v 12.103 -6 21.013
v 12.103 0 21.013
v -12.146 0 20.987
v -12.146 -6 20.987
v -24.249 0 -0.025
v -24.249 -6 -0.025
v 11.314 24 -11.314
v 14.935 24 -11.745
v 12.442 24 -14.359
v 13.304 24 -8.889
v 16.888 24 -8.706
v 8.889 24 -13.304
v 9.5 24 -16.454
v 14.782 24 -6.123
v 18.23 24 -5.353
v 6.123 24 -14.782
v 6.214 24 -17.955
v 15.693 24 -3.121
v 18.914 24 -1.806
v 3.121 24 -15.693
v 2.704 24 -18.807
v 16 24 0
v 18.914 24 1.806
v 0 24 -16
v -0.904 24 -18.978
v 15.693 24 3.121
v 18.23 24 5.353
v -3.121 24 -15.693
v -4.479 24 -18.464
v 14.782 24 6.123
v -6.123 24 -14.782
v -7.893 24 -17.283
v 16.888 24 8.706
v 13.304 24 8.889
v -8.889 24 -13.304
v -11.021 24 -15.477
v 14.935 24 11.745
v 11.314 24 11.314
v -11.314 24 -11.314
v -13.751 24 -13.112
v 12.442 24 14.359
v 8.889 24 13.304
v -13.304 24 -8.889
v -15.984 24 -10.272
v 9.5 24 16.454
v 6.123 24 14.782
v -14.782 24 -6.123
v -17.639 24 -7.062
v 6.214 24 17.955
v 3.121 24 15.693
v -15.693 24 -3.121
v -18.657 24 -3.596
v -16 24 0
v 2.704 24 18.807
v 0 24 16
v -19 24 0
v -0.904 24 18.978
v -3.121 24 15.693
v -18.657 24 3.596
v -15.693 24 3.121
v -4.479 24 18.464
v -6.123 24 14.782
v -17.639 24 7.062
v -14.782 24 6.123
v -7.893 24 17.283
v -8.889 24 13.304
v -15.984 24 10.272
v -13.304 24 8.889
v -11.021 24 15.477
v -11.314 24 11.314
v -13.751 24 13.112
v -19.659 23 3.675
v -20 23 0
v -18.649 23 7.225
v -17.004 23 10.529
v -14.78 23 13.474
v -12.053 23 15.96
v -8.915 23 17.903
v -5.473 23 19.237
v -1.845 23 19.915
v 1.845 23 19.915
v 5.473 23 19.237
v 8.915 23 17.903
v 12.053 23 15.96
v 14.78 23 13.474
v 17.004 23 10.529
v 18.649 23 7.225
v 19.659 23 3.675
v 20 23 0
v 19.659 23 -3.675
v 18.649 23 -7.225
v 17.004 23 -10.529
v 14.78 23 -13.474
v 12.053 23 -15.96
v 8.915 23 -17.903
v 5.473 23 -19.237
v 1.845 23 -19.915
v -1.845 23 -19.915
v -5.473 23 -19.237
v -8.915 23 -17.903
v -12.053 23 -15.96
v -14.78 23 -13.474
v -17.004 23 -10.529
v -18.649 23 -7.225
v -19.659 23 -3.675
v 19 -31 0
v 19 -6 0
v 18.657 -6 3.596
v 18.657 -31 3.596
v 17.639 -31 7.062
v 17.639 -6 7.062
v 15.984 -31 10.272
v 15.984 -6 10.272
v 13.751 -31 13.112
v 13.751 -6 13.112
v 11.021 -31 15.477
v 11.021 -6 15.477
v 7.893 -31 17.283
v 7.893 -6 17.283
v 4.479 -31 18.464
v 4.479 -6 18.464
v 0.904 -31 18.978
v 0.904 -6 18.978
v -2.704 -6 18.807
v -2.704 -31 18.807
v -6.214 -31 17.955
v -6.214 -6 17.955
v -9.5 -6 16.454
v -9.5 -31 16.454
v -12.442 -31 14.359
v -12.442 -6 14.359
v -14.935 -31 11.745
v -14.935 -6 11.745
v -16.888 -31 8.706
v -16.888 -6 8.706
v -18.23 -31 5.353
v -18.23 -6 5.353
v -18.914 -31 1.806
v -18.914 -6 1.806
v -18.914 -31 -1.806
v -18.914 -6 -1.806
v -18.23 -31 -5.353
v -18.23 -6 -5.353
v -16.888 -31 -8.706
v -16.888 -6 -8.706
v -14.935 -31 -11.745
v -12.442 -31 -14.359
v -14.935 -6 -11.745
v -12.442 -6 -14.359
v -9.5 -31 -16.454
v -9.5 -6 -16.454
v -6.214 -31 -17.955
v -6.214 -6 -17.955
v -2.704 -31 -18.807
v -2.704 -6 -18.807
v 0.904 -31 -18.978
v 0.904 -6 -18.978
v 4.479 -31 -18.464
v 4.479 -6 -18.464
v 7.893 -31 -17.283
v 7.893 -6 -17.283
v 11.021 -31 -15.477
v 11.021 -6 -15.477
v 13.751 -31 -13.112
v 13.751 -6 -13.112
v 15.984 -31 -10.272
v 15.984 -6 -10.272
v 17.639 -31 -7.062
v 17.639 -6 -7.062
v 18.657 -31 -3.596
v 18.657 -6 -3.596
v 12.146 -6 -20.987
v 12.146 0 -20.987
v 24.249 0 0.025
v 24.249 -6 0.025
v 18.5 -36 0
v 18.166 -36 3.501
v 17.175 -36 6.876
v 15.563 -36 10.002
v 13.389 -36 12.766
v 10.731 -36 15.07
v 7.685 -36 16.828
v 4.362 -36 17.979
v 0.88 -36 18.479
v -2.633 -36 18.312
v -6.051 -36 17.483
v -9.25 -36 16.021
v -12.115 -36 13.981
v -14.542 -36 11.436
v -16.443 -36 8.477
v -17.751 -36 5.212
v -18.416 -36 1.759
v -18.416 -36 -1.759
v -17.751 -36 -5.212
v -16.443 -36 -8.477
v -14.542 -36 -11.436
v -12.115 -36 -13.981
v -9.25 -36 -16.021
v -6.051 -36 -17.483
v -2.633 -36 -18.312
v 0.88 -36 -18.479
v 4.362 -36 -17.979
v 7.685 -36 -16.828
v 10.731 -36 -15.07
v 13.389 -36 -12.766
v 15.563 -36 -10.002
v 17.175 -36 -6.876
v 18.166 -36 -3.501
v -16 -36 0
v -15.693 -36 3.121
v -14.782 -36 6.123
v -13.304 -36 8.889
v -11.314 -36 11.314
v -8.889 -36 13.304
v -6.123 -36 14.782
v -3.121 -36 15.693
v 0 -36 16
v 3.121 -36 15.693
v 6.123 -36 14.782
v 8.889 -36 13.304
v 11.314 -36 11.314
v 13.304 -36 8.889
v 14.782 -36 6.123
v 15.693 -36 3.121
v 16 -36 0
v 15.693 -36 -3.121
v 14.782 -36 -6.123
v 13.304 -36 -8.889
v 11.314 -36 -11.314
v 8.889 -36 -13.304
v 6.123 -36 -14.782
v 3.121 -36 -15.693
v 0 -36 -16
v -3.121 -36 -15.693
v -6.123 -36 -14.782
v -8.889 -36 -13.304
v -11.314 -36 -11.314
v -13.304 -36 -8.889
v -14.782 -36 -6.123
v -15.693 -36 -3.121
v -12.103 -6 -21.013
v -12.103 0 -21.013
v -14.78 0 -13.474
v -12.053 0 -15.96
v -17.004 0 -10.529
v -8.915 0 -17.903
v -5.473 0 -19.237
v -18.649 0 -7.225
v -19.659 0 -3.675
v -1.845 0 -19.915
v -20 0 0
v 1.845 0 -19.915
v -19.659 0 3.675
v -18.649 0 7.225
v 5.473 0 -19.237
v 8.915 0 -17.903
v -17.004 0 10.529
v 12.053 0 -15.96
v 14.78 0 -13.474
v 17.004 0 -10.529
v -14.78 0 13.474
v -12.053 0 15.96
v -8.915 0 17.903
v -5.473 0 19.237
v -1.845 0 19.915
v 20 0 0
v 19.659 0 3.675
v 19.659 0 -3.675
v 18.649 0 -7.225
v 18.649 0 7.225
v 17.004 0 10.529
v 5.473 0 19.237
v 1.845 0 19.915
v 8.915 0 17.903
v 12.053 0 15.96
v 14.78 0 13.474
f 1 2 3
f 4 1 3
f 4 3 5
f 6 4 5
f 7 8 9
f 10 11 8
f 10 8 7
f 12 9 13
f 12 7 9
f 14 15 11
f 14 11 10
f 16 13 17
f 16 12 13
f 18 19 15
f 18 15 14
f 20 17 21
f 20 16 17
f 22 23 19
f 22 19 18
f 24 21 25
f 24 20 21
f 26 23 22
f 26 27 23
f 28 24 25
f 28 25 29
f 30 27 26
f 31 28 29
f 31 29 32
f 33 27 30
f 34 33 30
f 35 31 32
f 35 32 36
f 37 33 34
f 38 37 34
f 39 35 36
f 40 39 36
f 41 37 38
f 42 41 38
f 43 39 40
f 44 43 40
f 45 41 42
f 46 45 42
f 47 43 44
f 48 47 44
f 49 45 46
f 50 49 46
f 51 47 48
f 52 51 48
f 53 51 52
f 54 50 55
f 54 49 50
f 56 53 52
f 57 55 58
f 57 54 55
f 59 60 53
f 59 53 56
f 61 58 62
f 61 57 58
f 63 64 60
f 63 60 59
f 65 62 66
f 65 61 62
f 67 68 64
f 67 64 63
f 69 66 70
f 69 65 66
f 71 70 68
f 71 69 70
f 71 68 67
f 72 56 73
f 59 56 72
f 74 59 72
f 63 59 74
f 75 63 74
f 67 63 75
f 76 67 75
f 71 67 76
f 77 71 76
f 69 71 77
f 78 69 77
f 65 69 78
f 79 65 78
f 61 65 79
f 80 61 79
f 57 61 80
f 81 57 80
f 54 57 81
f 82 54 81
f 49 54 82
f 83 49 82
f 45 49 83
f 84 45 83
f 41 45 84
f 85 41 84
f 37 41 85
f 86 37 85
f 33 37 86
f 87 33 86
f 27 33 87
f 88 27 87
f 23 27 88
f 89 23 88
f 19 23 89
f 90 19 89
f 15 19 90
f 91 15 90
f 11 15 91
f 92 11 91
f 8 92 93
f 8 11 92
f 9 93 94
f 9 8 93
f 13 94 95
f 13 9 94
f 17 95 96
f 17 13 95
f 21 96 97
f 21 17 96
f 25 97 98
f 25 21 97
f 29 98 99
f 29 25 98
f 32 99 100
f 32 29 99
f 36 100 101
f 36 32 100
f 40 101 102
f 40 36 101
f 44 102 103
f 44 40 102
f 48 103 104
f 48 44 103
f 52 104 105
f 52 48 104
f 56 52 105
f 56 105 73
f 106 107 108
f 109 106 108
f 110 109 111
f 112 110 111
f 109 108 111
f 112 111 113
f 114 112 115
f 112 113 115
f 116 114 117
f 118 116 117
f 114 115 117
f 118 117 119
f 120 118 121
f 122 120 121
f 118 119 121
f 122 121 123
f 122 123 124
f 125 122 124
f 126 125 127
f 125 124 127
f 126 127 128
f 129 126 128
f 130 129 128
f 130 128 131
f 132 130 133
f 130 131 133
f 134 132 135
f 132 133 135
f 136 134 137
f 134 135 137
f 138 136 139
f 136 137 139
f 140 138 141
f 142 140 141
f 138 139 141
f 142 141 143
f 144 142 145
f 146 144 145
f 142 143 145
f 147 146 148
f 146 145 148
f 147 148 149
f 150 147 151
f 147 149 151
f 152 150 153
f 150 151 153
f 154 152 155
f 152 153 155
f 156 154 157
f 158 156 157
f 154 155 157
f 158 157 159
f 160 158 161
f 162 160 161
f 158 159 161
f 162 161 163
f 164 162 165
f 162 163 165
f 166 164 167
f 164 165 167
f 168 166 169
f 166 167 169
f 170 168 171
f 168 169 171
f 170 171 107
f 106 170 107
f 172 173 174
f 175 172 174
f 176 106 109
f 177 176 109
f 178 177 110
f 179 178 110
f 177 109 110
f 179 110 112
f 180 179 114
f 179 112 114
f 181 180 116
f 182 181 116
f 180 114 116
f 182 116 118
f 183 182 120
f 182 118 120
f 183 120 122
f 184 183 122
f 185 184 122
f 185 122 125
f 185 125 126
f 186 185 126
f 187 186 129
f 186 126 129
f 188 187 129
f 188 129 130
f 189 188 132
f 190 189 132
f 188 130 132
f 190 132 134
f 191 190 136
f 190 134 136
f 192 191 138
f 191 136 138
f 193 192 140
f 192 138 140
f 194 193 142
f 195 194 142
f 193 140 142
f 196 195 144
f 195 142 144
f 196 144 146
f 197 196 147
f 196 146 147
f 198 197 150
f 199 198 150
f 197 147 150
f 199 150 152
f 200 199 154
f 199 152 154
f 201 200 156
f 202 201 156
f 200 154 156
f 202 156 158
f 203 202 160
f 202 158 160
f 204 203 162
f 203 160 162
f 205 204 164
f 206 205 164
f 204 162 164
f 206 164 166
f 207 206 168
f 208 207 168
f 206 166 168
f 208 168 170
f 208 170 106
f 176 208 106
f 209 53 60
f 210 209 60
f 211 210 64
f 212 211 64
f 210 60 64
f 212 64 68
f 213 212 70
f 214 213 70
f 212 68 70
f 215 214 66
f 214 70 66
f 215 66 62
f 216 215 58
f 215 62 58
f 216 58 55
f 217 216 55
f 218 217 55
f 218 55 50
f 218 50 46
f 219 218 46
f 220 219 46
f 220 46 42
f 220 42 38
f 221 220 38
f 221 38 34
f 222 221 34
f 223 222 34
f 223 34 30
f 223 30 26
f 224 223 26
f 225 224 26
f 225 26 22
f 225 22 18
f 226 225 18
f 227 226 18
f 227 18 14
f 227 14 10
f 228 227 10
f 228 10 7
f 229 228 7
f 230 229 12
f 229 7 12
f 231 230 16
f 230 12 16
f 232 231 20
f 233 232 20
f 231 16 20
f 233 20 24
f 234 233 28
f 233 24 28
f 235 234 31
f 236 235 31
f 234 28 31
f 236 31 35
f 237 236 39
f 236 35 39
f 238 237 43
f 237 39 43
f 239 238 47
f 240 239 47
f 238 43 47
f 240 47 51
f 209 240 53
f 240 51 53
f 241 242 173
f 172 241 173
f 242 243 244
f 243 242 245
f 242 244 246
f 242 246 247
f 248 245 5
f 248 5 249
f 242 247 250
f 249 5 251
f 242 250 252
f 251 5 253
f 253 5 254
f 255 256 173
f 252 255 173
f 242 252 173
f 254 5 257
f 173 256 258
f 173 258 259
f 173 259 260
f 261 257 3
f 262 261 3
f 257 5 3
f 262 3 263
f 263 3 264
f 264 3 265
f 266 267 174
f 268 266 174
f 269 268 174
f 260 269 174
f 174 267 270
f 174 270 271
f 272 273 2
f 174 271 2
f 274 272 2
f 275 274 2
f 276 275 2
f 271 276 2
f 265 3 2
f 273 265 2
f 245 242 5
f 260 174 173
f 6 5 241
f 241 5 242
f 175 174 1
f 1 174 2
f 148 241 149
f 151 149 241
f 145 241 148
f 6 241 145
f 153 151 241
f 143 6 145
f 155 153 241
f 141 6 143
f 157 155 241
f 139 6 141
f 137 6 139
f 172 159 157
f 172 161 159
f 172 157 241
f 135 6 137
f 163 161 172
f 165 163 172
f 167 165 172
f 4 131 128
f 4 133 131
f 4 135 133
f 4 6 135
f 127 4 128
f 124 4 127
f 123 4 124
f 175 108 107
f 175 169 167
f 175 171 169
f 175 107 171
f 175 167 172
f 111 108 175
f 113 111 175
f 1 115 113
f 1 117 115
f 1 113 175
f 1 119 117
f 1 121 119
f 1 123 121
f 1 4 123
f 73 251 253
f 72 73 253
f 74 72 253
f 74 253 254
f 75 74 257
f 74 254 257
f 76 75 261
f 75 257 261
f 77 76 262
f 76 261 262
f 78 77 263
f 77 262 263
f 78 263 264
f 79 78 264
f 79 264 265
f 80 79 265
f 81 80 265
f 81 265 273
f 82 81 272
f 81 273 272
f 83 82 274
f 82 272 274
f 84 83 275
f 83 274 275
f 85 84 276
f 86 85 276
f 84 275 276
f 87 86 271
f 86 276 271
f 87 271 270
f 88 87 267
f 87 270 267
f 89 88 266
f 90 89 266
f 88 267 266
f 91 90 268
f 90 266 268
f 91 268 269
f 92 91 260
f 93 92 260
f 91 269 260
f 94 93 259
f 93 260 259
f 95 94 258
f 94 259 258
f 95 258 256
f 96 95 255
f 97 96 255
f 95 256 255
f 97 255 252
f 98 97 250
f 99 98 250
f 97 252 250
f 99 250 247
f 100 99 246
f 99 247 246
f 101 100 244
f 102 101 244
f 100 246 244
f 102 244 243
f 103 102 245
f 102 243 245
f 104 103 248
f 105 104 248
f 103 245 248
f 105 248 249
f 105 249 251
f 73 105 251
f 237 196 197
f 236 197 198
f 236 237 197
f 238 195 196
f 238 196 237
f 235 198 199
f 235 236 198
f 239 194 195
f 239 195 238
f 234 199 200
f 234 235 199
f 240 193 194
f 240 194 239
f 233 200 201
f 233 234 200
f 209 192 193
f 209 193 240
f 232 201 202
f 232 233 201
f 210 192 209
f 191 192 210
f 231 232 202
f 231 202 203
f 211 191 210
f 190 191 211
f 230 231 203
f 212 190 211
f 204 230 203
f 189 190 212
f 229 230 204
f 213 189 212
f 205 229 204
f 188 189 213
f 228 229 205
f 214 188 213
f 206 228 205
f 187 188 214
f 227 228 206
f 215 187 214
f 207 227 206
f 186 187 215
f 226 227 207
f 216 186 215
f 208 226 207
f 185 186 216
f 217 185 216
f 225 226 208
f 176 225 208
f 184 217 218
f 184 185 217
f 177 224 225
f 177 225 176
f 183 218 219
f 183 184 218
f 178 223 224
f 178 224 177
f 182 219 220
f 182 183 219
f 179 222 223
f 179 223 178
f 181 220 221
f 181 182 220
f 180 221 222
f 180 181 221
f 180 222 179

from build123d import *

# Parameters (mm, degrees)
F1_DEPTH = 6
F2_R     = 19
F3_DEPTH = 30
F4_R     = 20
F5_DEPTH = 24
F6_R     = 16
F7_DEPTH = 60.001
F8_SIZE  = 1
F9_SIZE2 = 5
F9_SIZE  = 0.5


with BuildPart() as f1:
    # F0 (on Front) → F1 (new body)
    with BuildSketch(Plane.XZ):
        Polygon((24.248698, 0.025049), (12.102656, 21.012513), (-12.146042, 20.987464), (-24.248698, -0.025049), (-12.102656, -21.012513), (12.146042, -20.987464), align=None)
    extrude(amount=F1_DEPTH)

    # F2 (on face) → F3 (join)
    with BuildSketch(Plane.XZ.offset(6)):
        Circle(F2_R)
    extrude(amount=F3_DEPTH)

    # F4 (on face) → F5 (join)
    with BuildSketch(Plane(origin=(0, 0, 0), x_dir=(-1, 0, 0), z_dir=(0, 1, 0))):
        Circle(F4_R)
    extrude(amount=F5_DEPTH)

    # F6 (on face) → F7 (cut, through all)
    with BuildSketch(Plane(origin=(0, 24, 0), x_dir=(-1, 0, 0), z_dir=(0, 1, 0))):
        Circle(F6_R)
    extrude(amount=-F7_DEPTH, mode=Mode.SUBTRACT)

    # F8
    f8_edges = [f1.edges().sort_by_distance(p)[0] for p in [
        (20, 24, 0),
    ]]
    chamfer(f8_edges, length=F8_SIZE)

    # F9
    f9_edges = [f1.edges().sort_by_distance(p)[0] for p in [
        (-19, -36, 0),
    ]]
    chamfer(f9_edges, length=F9_SIZE, length2=F9_SIZE2)


solid = f1.part
